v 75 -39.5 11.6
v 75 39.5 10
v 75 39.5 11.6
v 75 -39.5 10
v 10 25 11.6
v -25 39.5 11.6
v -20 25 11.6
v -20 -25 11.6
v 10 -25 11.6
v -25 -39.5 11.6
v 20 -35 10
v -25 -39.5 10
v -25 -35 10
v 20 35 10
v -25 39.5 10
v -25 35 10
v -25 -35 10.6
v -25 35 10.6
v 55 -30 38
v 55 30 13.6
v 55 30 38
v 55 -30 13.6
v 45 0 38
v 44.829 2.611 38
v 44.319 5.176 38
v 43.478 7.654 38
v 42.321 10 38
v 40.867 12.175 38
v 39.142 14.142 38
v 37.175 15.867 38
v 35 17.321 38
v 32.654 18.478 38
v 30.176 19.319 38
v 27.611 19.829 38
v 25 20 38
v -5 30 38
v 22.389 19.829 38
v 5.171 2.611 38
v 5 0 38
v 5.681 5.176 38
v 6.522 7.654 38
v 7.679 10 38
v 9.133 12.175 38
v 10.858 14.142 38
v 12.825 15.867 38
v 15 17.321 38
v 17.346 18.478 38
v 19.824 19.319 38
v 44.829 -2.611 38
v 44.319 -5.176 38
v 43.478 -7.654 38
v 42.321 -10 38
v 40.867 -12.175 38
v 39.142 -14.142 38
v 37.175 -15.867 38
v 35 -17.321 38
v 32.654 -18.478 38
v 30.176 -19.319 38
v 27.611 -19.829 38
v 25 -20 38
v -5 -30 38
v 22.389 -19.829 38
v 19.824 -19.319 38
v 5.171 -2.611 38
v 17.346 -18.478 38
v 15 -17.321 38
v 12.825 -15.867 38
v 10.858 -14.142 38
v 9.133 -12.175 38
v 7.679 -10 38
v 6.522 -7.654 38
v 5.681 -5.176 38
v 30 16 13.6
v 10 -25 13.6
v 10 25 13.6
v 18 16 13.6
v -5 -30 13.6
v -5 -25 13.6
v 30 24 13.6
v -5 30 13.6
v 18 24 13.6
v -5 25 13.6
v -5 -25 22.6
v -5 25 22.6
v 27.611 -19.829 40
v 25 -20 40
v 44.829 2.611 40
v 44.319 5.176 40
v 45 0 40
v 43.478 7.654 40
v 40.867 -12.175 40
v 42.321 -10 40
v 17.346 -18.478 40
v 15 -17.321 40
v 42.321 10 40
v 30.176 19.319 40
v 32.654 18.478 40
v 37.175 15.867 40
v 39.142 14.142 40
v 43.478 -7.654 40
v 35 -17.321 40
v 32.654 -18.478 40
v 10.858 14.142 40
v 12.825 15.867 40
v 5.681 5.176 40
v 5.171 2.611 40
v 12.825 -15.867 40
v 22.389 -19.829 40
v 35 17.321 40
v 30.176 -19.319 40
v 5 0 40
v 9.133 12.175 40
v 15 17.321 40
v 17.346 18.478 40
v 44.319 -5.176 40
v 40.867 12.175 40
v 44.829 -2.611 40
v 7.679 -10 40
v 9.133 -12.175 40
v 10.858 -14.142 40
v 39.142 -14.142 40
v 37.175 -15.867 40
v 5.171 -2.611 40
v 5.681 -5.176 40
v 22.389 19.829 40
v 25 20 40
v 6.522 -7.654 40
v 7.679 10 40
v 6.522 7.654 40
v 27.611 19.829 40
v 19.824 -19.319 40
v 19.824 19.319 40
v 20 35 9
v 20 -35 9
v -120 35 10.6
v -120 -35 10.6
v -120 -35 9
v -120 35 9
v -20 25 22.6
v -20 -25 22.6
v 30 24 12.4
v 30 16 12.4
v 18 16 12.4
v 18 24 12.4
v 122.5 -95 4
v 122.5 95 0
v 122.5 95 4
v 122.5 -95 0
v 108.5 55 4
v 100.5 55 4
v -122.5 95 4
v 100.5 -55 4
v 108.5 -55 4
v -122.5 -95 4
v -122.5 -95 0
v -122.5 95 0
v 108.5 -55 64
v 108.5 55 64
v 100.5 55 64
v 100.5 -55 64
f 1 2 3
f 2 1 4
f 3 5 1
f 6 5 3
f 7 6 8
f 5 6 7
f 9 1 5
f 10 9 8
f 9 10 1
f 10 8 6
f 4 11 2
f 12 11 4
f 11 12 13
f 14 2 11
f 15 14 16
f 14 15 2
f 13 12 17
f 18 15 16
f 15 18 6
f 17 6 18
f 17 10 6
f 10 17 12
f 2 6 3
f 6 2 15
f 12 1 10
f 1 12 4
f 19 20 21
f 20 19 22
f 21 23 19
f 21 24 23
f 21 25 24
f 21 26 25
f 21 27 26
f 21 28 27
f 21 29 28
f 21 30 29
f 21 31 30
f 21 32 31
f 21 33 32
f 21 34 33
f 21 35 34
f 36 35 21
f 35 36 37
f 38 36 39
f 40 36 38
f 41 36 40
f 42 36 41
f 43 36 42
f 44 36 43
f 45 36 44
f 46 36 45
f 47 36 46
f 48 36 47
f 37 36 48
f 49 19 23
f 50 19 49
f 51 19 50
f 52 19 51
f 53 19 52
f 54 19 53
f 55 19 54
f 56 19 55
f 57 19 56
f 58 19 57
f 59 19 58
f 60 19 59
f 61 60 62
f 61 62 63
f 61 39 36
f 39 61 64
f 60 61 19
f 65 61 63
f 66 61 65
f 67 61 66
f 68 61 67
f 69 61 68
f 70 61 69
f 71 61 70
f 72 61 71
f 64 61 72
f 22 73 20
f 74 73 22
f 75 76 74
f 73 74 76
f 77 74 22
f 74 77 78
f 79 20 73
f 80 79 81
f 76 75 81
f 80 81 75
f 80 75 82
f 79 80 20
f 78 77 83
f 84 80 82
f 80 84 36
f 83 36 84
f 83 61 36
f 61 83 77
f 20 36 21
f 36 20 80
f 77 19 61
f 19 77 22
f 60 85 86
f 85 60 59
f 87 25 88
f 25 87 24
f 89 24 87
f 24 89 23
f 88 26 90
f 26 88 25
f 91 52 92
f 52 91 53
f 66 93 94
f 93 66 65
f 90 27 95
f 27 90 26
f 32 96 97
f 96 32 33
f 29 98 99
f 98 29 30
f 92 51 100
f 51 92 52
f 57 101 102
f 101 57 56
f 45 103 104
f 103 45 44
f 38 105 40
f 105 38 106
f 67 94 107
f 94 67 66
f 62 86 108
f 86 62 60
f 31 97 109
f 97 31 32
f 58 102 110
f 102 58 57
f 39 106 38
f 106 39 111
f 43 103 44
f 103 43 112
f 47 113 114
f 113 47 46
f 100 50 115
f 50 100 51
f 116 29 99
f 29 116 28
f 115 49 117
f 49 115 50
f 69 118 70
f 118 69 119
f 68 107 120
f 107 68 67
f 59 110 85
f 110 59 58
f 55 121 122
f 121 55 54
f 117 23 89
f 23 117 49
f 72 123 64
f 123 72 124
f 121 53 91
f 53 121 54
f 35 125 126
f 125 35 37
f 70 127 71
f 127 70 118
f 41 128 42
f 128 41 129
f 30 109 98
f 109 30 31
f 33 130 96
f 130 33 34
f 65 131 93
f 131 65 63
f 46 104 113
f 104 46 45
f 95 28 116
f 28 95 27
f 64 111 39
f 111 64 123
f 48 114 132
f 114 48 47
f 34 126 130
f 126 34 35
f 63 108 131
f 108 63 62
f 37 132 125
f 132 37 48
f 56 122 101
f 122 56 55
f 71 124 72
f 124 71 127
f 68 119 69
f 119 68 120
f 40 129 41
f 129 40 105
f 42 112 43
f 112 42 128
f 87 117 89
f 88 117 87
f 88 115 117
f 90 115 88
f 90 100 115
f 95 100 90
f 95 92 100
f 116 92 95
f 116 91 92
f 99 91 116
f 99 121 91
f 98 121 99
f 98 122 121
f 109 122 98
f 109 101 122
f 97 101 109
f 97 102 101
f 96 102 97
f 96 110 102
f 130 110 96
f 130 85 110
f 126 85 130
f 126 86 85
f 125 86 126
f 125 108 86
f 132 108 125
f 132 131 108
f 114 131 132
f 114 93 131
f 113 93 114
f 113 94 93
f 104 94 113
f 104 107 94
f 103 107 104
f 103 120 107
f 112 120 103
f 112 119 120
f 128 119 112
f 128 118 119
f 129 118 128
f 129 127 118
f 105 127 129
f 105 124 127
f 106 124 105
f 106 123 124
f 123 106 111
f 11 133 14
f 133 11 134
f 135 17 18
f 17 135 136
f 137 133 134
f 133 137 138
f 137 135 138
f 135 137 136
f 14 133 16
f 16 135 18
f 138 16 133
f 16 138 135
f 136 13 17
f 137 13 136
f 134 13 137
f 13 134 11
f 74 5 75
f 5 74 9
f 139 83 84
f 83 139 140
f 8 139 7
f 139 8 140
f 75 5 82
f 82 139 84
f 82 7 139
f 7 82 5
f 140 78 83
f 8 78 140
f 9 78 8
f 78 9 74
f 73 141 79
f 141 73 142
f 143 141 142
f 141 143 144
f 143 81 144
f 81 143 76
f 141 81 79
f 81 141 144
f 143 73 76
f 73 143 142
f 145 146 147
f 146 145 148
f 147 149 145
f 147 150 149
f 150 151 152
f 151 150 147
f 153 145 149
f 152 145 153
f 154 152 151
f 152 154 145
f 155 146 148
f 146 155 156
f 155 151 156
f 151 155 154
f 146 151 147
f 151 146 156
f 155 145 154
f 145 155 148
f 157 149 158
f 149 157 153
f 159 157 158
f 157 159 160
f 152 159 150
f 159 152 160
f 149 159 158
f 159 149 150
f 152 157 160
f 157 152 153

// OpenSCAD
// file: params.scad
// params.scad — 단일 진실 원천 (모든 .scad 가 include)
//
// 변경 시 다른 파일 안 건드려도 됨. 측정값이 다르면 여기만 수정.
// 단위: mm.

// ────────────────────────────────────────────────────────────────
// HSP 94118 차체 (1/10 short course) — 사용자 측정값으로 보정 권장
// ────────────────────────────────────────────────────────────────
// 차체에 박혀 있는 4개의 body post 가 deck 의 mounting feet 와 맞물림.
// 자기 차체 분해해서 자/캘리퍼로 측정해서 다음 두 값을 갱신.
chassis_post_spacing_x = 215;   // 앞뒤 post 간 거리
chassis_post_spacing_y = 170;   // 좌우 post 간 거리
chassis_post_diameter  = 6;     // body post 굵기
chassis_post_clip_d    = 1.5;   // body clip 핀 굵기 (수평 관통)
chassis_post_height    = 80;    // chassis 윗면 ~ post 끝 높이

// ────────────────────────────────────────────────────────────────
// 데크 플레이트
// ────────────────────────────────────────────────────────────────
deck_thickness    = 4;          // 4mm PLA = 충분한 강성
deck_margin_x     = 15;         // post 바깥쪽 여유 (앞뒤)
deck_margin_y     = 10;         // post 바깥쪽 여유 (좌우)
deck_corner_r     = 8;          // 모서리 둥글기

deck_size_x = chassis_post_spacing_x + 2 * deck_margin_x;   // 245
deck_size_y = chassis_post_spacing_y + 2 * deck_margin_y;   // 190

// 데크 mounting foot — body post 가 끼는 구멍 + body clip 슬롯
foot_clearance     = 0.4;       // post 와 hole 간격 (PLA 수축 보정)
foot_hole_d        = chassis_post_diameter + foot_clearance;
foot_clip_slot_w   = chassis_post_clip_d + 0.4;
foot_clip_slot_h   = 2.0;       // 슬롯 세로 길이 (post 위아래 위치 조정 여유)

// ────────────────────────────────────────────────────────────────
// Jetson Orin Nano Super Dev Kit
// ────────────────────────────────────────────────────────────────
// 캐리어 보드 (J401/J501 호환 dev kit 기준).
jetson_pcb_x       = 100;
jetson_pcb_y       = 79;
jetson_pcb_z       = 1.6;       // PCB 두께
jetson_hole_dx     = 86;        // 4 모서리 M3 홀 가로 간격
jetson_hole_dy     = 58;        // 세로 간격
jetson_hole_d      = 3.3;       // M3 통과
jetson_standoff_h  = 6;         // PCB 바닥 ~ deck 사이 여유 (heatsink 고려해 deck 윗면에 설치)
jetson_total_z     = 30;        // PCB + heatsink/fan 전체 높이 (충돌 회피용)

// ────────────────────────────────────────────────────────────────
// STM32 NUCLEO-H753ZI
// ────────────────────────────────────────────────────────────────
nucleo_pcb_x       = 140;
nucleo_pcb_y       = 70;
nucleo_pcb_z       = 1.6;
// NUCLEO 보드 4 모서리 M3 마운팅 홀 — 데이터시트 UM2407 figure 6 참조.
// 측정값과 다르면 보정.
nucleo_hole_dx     = 130;
nucleo_hole_dy     = 60;
nucleo_hole_d      = 3.3;
nucleo_standoff_h  = 5;
nucleo_total_z     = 18;        // ST-LINK 부품 포함 위쪽 높이

// ────────────────────────────────────────────────────────────────
// IMX219 카메라 모듈 (Arducam/Waveshare 표준 보드)
// ────────────────────────────────────────────────────────────────
imx219_pcb_x       = 25;
imx219_pcb_y       = 24;
imx219_pcb_z       = 1.0;
imx219_hole_dx     = 21;
imx219_hole_dy     = 12.5;
imx219_hole_d      = 2.4;       // M2 통과 (2.0 + 0.4 클리어런스)
imx219_lens_offset_y = 2.5;     // 렌즈 중심이 PCB 중심에서 살짝 위
imx219_lens_d      = 7.0;       // 렌즈 마운트 외경

// 스테레오 baseline (사용자 선택: 80mm)
camera_baseline    = 80;
camera_tilt_deg    = 8;         // 도로 8° 아래로 향함 (기본값, 슬롯으로 ±15° 조정)

// ────────────────────────────────────────────────────────────────
// 카메라 마스트 (전방 수직 봉)
// ────────────────────────────────────────────────────────────────
mast_height        = 60;        // deck 위에서 60mm
mast_base_thickness = 4;
mast_arm_thickness = 3;
mast_arm_width     = 8;

// ────────────────────────────────────────────────────────────────
// 배터리 (LiPo 2S, 일반적인 5000mAh hard-case 가정)
// ────────────────────────────────────────────────────────────────
battery_x = 140;
battery_y = 47;
battery_z = 25;
battery_strap_w = 12;           // 벨크로 스트랩 슬롯 너비

// ────────────────────────────────────────────────────────────────
// 커버 셸 (RC 바디 대체)
// ────────────────────────────────────────────────────────────────
cover_thickness    = 2.4;       // 얇게 (가벼움 + 빠른 출력)
cover_height       = 95;        // deck 위 95mm — Jetson + 여유
cover_overhang     = 5;         // deck 가장자리 바깥으로 빠지는 양
cover_vent_slot_w  = 4;
cover_vent_slot_l  = 30;

// ────────────────────────────────────────────────────────────────
// 공통
// ────────────────────────────────────────────────────────────────
$fn = 48;                       // 렌더 해상도
m3_nut_w           = 5.6;       // M3 너트 평면 거리 (육각 across-flats)
m3_nut_h           = 2.5;       // M3 너트 두께
m3_head_d          = 6.0;       // M3 캡헤드 외경
m3_head_h          = 3.0;
// main file
// assembly.scad — 전체 가시화. STL 출력용 아님 (각 부품 .scad 가 STL 마스터).
//
// 이 파일을 OpenSCAD 에서 렌더하면 deck/마스트/Jetson/NUCLEO/cover 가
// 한 좌표계에서 어떻게 맞물리는지 보임. 충돌 검사용.
//
// 사용:
//   openscad assembly.scad        # GUI
//   openscad -o assembly.png assembly.scad     # 렌더만

include <params.scad>;

show_deck   = true;
show_mast   = true;
show_jetson = true;
show_nucleo = true;
show_cover  = false;     // true 면 내부 부품 가림. 외형 확인 시 켤 것.

// ────────────────────────────────────────────────────────────────
// 부품 placeholder (실제 BOM 의 외형 모사 — 충돌 보기 용)
// ────────────────────────────────────────────────────────────────
module jetson_placeholder() {
    color("DarkGreen", 0.9) {
        cube([jetson_pcb_x, jetson_pcb_y, jetson_pcb_z], center=true);
        // heatsink + fan 모사
        translate([0, 0, jetson_pcb_z/2 + (jetson_total_z - jetson_pcb_z)/2])
            color("Silver")
                cube([60, 60, jetson_total_z - jetson_pcb_z - 4], center=true);
        translate([0, 0, jetson_total_z - jetson_pcb_z/2 - 2])
            color("Black")
                cylinder(d=40, h=4, center=true);
    }
}

module nucleo_placeholder() {
    color("DarkGreen", 0.9) {
        cube([nucleo_pcb_x, nucleo_pcb_y, nucleo_pcb_z], center=true);
        // ST-LINK 부분 (한쪽 끝, 두꺼움)
        translate([nucleo_pcb_x/2 - 25, 0, nucleo_pcb_z/2 + 6])
            color("Silver")
                cube([30, 50, 12], center=true);
        // Mini-USB 커넥터 (튀어나옴)
        translate([nucleo_pcb_x/2 + 4, 20, nucleo_pcb_z + 4])
            color("Silver")
                cube([12, 8, 6], center=true);
    }
}

// ────────────────────────────────────────────────────────────────
// 배치 (모든 부품의 좌표계 = deck 중심, deck 윗면 = z=deck_thickness)
// ────────────────────────────────────────────────────────────────
if (show_deck)
    color("LightGray", 0.8)
        import_or_module("top_deck");

if (show_jetson) {
    // standoff 위에 PCB
    translate([25, 0, deck_thickness + jetson_standoff_h + jetson_pcb_z/2])
        jetson_placeholder();
}

if (show_nucleo) {
    translate([-50, 0, deck_thickness + nucleo_standoff_h + nucleo_pcb_z/2])
        nucleo_placeholder();
}

if (show_mast) {
    translate([deck_size_x/2 - 18, 0, deck_thickness])
        color("DimGray", 0.85)
            import_or_module("camera_mast");
}

if (show_cover) {
    color("Coral", 0.4)
        translate([0, 0, deck_thickness])
            import_or_module("cover_shell");
}

// 차체 시뮬레이션 (참고용 wireframe)
%color("Gray", 0.3)
    translate([0, 0, -chassis_post_height/2])
        cube([chassis_post_spacing_x + 60,
              chassis_post_spacing_y + 30,
              chassis_post_height], center=true);

// body post 4개
for (sx = [-1, 1], sy = [-1, 1])
    %color("Gray", 0.4)
        translate([sx * chassis_post_spacing_x/2, sy * chassis_post_spacing_y/2, -2])
            cylinder(d=chassis_post_diameter, h=chassis_post_height + deck_thickness + 5);

// ────────────────────────────────────────────────────────────────
// 헬퍼: 다른 .scad 파일을 module 로 부르는 흉내.
// OpenSCAD 는 include 가 top-level 코드도 실행해버려 까다로움 →
// 여기서는 단순히 import 하지 말고 각 .scad 를 STL 로 미리 렌더해서 import 하거나,
// use <...> 로 모듈만 가져올 것.
// ────────────────────────────────────────────────────────────────
module import_or_module(name) {
    if (name == "top_deck") {
        // 인라인 placeholder — 실제 모양은 top_deck.scad 가 마스터
        translate([-deck_size_x/2, -deck_size_y/2, 0])
            cube([deck_size_x, deck_size_y, deck_thickness]);
    } else if (name == "camera_mast") {
        translate([0, 0, mast_height/2])
            cube([8, camera_baseline + 30, mast_height], center=true);
    } else if (name == "cover_shell") {
        translate([-deck_size_x/2 - 5, -deck_size_y/2 - 5, 0])
            cube([deck_size_x + 10, deck_size_y + 10, cover_height]);
    }
}
